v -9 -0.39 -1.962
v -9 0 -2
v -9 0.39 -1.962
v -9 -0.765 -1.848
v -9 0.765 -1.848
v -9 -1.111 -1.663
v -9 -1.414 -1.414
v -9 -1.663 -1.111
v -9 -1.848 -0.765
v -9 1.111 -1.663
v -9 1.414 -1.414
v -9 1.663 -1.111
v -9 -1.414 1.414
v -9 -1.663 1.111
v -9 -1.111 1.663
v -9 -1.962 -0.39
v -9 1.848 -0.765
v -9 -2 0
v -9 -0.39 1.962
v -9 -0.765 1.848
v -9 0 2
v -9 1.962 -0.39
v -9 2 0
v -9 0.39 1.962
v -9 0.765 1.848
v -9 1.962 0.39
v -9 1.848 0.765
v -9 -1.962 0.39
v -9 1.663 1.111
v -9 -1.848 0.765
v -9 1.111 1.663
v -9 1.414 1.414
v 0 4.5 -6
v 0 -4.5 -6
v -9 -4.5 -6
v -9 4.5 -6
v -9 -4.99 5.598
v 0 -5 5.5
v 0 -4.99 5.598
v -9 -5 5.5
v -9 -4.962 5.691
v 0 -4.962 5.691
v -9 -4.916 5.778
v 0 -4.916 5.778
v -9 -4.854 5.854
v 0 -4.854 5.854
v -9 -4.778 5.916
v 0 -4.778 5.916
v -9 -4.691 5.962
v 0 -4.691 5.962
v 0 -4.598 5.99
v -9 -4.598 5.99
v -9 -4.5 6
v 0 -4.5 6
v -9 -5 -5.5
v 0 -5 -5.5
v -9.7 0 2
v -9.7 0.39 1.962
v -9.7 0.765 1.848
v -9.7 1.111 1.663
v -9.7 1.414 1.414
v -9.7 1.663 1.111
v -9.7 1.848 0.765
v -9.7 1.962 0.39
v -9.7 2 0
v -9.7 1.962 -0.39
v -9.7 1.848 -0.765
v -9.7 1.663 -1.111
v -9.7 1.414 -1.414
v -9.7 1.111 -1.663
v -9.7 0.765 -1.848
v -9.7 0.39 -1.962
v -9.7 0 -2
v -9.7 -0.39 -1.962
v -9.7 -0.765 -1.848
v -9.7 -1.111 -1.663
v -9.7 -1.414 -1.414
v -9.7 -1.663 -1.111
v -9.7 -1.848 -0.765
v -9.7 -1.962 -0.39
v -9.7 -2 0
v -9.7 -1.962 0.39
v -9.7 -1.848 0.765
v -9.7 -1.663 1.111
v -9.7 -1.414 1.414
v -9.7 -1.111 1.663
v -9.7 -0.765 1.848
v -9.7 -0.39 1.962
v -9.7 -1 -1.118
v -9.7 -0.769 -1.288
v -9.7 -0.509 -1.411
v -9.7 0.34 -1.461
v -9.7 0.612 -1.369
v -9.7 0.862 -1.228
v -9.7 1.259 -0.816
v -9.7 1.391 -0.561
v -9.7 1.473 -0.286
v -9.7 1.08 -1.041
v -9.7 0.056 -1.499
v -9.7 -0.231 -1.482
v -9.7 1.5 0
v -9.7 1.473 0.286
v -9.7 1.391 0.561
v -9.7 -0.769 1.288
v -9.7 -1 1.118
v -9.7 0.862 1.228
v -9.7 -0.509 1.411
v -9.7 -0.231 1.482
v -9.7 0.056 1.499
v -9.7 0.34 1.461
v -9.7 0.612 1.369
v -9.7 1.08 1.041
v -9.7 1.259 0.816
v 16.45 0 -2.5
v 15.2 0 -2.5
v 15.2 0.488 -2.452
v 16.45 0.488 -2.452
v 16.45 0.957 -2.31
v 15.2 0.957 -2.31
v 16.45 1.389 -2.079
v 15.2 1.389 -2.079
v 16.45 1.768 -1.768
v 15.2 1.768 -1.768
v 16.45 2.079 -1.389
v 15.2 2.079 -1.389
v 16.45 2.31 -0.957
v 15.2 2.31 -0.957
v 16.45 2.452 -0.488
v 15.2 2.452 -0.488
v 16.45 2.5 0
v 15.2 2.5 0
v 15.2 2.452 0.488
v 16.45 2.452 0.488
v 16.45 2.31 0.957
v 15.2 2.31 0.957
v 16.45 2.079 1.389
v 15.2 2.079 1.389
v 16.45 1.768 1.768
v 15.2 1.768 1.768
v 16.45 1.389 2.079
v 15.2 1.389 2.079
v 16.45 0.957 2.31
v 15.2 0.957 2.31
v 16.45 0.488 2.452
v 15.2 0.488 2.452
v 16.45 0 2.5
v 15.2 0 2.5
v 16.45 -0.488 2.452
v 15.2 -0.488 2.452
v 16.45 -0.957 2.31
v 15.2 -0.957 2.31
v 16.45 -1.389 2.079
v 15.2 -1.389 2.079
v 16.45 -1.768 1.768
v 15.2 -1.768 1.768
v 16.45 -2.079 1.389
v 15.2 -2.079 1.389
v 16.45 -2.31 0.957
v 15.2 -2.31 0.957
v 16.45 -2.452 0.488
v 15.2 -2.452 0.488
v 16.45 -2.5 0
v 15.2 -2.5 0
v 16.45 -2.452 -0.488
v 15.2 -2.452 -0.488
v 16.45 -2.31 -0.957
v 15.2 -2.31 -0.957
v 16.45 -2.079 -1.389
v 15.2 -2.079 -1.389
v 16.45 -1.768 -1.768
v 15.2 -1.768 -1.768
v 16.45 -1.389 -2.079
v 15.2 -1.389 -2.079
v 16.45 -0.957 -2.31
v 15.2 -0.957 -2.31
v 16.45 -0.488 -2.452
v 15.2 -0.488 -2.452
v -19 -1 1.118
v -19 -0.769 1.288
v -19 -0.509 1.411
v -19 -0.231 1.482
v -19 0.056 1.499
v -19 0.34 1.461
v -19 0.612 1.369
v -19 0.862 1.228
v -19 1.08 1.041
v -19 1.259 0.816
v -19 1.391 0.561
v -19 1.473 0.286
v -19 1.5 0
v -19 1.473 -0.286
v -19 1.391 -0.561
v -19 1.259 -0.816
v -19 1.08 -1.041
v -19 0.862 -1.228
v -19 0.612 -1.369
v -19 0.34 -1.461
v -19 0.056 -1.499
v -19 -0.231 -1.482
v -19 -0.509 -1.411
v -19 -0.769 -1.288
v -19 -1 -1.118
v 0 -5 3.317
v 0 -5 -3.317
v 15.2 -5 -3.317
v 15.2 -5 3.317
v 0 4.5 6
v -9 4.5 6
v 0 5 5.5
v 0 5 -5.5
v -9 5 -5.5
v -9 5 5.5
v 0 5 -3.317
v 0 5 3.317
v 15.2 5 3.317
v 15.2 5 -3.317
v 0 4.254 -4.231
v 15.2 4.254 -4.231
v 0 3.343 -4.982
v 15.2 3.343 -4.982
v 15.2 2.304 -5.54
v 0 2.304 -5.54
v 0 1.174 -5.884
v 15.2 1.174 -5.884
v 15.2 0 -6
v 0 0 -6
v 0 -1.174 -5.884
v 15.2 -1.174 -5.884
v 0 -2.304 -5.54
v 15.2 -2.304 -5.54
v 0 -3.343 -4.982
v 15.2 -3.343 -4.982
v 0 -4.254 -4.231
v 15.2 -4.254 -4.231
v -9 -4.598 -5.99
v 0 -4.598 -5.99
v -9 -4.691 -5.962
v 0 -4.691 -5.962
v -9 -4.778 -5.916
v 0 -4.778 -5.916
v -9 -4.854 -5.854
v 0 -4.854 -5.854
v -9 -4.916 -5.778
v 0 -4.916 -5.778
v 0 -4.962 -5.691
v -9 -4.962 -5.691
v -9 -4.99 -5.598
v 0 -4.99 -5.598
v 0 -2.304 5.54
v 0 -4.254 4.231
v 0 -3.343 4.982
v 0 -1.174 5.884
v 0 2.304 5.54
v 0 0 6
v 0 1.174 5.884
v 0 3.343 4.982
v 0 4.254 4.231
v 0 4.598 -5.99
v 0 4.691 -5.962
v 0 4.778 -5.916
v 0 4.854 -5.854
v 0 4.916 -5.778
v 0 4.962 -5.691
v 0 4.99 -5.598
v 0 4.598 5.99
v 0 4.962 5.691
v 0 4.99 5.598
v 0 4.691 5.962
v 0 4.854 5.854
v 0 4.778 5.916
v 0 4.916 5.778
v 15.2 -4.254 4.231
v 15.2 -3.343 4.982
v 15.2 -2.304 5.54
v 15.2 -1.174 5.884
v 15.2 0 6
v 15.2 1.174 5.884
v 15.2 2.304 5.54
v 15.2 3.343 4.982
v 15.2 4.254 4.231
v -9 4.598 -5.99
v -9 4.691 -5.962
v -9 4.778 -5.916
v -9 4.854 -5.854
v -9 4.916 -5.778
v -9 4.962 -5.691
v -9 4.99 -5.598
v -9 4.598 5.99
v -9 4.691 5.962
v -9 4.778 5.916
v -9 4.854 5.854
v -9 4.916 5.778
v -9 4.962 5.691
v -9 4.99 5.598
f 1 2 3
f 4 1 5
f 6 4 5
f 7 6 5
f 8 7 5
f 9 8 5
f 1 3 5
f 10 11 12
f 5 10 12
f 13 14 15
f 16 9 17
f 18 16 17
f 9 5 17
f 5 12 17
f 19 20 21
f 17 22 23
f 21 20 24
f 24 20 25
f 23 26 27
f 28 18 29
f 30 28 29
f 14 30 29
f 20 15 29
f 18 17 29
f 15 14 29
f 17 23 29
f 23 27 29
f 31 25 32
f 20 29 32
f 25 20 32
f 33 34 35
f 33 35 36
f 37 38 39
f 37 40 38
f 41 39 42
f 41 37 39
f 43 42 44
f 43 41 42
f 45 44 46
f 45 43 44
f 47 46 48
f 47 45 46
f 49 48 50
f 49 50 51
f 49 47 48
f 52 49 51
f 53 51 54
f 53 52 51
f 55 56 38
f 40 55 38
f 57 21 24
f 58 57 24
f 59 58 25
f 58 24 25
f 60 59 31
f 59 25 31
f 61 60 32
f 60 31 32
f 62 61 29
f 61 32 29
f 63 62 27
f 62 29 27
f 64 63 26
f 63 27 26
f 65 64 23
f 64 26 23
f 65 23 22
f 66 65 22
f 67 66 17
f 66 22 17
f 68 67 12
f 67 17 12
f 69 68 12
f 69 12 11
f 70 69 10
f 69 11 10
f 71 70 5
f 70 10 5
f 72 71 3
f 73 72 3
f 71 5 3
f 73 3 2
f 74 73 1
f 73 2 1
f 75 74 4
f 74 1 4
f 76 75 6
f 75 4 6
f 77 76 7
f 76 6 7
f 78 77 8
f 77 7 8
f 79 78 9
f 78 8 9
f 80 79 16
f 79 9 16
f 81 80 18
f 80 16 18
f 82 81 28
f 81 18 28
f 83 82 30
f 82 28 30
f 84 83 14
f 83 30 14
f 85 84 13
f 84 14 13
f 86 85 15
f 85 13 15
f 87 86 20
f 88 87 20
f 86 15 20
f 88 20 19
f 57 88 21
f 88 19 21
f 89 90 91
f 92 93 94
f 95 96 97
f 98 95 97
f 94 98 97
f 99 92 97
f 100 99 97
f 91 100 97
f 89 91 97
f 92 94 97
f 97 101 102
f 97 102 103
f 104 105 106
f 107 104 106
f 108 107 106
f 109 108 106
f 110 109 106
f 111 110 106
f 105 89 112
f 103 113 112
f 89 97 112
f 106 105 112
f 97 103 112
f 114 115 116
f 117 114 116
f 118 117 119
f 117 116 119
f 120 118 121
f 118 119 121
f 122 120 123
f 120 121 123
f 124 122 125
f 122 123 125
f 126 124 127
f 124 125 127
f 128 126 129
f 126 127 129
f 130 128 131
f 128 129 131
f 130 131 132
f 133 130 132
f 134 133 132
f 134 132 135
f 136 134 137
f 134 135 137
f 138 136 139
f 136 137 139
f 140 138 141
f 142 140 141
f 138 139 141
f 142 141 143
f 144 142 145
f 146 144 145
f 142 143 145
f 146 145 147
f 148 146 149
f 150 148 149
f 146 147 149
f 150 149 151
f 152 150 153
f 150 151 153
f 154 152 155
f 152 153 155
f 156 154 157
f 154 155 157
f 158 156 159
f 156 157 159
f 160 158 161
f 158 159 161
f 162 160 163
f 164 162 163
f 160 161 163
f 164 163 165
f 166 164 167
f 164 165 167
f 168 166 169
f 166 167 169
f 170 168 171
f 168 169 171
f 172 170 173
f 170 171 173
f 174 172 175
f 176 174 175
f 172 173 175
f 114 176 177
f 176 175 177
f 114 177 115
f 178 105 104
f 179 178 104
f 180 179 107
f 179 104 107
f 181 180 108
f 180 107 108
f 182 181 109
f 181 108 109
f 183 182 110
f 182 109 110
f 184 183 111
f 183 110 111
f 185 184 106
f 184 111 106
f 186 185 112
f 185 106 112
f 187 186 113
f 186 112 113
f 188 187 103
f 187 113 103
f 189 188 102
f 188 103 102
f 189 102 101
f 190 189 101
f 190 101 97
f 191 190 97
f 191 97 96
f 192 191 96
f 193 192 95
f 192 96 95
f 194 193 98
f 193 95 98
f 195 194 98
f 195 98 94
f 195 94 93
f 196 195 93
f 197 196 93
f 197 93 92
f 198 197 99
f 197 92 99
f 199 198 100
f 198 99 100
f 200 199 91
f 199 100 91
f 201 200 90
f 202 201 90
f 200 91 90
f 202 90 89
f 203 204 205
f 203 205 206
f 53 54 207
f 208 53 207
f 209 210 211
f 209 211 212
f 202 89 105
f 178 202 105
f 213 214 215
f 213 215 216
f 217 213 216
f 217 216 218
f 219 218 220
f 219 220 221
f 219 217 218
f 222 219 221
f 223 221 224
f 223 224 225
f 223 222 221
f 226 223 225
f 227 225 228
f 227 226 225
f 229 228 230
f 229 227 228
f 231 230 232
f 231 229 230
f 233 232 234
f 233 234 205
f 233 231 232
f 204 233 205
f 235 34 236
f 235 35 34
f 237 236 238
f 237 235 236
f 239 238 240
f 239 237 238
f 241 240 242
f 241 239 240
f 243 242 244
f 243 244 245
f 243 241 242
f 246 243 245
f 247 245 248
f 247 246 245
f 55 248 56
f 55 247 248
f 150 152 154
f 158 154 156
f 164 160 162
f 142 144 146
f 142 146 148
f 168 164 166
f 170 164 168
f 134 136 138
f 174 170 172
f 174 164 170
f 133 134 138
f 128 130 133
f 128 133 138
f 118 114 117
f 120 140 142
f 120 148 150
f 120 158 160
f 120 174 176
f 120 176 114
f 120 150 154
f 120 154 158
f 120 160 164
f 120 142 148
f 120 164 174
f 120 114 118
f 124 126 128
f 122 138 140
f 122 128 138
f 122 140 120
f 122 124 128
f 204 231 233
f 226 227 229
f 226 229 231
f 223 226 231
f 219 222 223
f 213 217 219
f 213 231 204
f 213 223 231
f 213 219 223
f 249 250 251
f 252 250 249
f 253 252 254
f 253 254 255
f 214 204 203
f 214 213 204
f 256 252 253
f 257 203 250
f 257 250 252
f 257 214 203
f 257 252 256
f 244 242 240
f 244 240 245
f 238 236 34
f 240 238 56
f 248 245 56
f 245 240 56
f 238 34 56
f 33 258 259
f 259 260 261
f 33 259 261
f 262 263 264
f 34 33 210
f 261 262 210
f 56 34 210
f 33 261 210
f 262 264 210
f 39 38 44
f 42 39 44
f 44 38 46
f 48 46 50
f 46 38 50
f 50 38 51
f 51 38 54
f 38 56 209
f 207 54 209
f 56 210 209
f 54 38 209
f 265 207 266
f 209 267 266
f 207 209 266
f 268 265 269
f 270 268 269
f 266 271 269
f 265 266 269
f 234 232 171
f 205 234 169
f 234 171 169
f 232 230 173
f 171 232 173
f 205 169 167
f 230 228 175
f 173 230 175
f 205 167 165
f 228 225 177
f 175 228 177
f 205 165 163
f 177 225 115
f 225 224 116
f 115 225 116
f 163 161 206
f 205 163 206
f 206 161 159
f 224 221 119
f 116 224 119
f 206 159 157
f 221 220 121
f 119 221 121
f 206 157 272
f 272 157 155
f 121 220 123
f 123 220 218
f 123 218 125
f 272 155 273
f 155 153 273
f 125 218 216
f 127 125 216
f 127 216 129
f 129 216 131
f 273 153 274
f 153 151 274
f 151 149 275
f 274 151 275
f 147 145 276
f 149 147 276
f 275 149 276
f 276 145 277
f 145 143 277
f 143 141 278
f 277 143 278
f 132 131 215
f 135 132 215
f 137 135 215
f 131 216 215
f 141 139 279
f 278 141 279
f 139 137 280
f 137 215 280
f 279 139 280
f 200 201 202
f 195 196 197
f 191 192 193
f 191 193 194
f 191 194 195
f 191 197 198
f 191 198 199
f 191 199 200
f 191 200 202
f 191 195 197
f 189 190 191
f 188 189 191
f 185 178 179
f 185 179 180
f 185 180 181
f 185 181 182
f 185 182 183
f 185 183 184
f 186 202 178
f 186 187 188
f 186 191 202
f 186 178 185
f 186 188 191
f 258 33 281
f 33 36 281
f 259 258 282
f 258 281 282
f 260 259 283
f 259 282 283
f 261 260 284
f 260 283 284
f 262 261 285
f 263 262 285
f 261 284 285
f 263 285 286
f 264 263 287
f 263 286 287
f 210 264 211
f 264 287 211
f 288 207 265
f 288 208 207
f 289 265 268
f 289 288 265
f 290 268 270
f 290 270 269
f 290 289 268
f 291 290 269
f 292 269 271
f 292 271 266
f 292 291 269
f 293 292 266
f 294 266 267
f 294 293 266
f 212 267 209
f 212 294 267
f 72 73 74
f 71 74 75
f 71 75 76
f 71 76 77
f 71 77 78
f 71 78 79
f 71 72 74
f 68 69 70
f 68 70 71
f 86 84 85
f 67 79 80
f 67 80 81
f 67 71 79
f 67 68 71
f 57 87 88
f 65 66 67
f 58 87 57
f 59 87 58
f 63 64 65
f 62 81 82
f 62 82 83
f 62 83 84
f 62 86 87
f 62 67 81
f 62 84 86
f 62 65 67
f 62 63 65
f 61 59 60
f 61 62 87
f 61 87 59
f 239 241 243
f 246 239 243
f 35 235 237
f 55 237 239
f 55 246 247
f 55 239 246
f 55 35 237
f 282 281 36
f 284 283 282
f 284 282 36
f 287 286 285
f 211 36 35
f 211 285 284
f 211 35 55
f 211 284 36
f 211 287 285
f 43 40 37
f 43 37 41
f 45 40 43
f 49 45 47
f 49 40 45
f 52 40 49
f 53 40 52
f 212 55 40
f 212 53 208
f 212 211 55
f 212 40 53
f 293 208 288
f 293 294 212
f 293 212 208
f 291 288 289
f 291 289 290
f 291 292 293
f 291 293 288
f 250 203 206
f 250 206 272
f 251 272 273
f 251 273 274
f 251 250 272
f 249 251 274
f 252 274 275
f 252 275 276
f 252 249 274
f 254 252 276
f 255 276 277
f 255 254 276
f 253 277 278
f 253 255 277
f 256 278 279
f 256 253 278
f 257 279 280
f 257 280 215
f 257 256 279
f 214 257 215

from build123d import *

# Parameters (mm, degrees)
BOSS_EXTRUDE1_DEPTH = 15.2
SKETCH2_R           = 2.5
BOSS_EXTRUDE2_DEPTH = 1.25
SKETCH3_W           = 12
SKETCH3_H           = 10
BOSS_EXTRUDE3_DEPTH = 9
SKETCH4_R           = 2
BOSS_EXTRUDE4_DEPTH = 0.7
BOSS_EXTRUDE5_DEPTH = 9.3
FILLET1_R           = 0.5


with BuildPart() as part:
    # Sketch1 → Boss-Extrude1 (new body)
    with BuildSketch(Plane(origin=(0, 0, 0), x_dir=(0, 0, -1), z_dir=(1, 0, 0))):
        with BuildLine():
            Line((-3.31662479, 5), (3.31662479, 5))
            ThreePointArc((3.31662479, 5), (6, 0), (3.31662479, -5))
            Line((3.31662479, -5), (-3.31662479, -5))
            ThreePointArc((-3.31662479, -5), (-6, 0), (-3.31662479, 5))
        make_face()
    extrude(amount=BOSS_EXTRUDE1_DEPTH)

    # Sketch2 → Boss-Extrude2 (add)
    with BuildSketch(Plane(origin=(15.2, 0, 0), x_dir=(0, 0, -1), z_dir=(1, 0, 0))):
        Circle(SKETCH2_R)
    extrude(amount=BOSS_EXTRUDE2_DEPTH)


with BuildPart() as body_2:
    # Sketch3 → Boss-Extrude3 (new body)
    with BuildSketch(Plane.ZY):
        Rectangle(SKETCH3_W, SKETCH3_H)
    extrude(amount=BOSS_EXTRUDE3_DEPTH)

    # Fillet1
    fillet1_edges = [body_2.edges().sort_by_distance(p)[0] for p in [
        (-4.5, -5, 6),
        (-4.5, -5, -6),
        (-4.5, 5, -6),
        (-4.5, 5, 6),
    ]]
    fillet(fillet1_edges, radius=FILLET1_R)


with BuildPart() as body_3:
    # Sketch4 → Boss-Extrude4 (new body)
    with BuildSketch(Plane.ZY.offset(9)):
        Circle(SKETCH4_R)
    extrude(amount=BOSS_EXTRUDE4_DEPTH)


with BuildPart() as body_4:
    # Sketch5 → Boss-Extrude5 (new body)
    with BuildSketch(Plane.ZY.offset(9.7)):
        with BuildLine():
            Line((-1.118033989, -1), (1.118033989, -1))
            ThreePointArc((1.118033989, -1), (0, 1.5), (-1.118033989, -1))
        make_face()
    extrude(amount=BOSS_EXTRUDE5_DEPTH)


solid = Compound([part.part, body_2.part, body_3.part, body_4.part])
